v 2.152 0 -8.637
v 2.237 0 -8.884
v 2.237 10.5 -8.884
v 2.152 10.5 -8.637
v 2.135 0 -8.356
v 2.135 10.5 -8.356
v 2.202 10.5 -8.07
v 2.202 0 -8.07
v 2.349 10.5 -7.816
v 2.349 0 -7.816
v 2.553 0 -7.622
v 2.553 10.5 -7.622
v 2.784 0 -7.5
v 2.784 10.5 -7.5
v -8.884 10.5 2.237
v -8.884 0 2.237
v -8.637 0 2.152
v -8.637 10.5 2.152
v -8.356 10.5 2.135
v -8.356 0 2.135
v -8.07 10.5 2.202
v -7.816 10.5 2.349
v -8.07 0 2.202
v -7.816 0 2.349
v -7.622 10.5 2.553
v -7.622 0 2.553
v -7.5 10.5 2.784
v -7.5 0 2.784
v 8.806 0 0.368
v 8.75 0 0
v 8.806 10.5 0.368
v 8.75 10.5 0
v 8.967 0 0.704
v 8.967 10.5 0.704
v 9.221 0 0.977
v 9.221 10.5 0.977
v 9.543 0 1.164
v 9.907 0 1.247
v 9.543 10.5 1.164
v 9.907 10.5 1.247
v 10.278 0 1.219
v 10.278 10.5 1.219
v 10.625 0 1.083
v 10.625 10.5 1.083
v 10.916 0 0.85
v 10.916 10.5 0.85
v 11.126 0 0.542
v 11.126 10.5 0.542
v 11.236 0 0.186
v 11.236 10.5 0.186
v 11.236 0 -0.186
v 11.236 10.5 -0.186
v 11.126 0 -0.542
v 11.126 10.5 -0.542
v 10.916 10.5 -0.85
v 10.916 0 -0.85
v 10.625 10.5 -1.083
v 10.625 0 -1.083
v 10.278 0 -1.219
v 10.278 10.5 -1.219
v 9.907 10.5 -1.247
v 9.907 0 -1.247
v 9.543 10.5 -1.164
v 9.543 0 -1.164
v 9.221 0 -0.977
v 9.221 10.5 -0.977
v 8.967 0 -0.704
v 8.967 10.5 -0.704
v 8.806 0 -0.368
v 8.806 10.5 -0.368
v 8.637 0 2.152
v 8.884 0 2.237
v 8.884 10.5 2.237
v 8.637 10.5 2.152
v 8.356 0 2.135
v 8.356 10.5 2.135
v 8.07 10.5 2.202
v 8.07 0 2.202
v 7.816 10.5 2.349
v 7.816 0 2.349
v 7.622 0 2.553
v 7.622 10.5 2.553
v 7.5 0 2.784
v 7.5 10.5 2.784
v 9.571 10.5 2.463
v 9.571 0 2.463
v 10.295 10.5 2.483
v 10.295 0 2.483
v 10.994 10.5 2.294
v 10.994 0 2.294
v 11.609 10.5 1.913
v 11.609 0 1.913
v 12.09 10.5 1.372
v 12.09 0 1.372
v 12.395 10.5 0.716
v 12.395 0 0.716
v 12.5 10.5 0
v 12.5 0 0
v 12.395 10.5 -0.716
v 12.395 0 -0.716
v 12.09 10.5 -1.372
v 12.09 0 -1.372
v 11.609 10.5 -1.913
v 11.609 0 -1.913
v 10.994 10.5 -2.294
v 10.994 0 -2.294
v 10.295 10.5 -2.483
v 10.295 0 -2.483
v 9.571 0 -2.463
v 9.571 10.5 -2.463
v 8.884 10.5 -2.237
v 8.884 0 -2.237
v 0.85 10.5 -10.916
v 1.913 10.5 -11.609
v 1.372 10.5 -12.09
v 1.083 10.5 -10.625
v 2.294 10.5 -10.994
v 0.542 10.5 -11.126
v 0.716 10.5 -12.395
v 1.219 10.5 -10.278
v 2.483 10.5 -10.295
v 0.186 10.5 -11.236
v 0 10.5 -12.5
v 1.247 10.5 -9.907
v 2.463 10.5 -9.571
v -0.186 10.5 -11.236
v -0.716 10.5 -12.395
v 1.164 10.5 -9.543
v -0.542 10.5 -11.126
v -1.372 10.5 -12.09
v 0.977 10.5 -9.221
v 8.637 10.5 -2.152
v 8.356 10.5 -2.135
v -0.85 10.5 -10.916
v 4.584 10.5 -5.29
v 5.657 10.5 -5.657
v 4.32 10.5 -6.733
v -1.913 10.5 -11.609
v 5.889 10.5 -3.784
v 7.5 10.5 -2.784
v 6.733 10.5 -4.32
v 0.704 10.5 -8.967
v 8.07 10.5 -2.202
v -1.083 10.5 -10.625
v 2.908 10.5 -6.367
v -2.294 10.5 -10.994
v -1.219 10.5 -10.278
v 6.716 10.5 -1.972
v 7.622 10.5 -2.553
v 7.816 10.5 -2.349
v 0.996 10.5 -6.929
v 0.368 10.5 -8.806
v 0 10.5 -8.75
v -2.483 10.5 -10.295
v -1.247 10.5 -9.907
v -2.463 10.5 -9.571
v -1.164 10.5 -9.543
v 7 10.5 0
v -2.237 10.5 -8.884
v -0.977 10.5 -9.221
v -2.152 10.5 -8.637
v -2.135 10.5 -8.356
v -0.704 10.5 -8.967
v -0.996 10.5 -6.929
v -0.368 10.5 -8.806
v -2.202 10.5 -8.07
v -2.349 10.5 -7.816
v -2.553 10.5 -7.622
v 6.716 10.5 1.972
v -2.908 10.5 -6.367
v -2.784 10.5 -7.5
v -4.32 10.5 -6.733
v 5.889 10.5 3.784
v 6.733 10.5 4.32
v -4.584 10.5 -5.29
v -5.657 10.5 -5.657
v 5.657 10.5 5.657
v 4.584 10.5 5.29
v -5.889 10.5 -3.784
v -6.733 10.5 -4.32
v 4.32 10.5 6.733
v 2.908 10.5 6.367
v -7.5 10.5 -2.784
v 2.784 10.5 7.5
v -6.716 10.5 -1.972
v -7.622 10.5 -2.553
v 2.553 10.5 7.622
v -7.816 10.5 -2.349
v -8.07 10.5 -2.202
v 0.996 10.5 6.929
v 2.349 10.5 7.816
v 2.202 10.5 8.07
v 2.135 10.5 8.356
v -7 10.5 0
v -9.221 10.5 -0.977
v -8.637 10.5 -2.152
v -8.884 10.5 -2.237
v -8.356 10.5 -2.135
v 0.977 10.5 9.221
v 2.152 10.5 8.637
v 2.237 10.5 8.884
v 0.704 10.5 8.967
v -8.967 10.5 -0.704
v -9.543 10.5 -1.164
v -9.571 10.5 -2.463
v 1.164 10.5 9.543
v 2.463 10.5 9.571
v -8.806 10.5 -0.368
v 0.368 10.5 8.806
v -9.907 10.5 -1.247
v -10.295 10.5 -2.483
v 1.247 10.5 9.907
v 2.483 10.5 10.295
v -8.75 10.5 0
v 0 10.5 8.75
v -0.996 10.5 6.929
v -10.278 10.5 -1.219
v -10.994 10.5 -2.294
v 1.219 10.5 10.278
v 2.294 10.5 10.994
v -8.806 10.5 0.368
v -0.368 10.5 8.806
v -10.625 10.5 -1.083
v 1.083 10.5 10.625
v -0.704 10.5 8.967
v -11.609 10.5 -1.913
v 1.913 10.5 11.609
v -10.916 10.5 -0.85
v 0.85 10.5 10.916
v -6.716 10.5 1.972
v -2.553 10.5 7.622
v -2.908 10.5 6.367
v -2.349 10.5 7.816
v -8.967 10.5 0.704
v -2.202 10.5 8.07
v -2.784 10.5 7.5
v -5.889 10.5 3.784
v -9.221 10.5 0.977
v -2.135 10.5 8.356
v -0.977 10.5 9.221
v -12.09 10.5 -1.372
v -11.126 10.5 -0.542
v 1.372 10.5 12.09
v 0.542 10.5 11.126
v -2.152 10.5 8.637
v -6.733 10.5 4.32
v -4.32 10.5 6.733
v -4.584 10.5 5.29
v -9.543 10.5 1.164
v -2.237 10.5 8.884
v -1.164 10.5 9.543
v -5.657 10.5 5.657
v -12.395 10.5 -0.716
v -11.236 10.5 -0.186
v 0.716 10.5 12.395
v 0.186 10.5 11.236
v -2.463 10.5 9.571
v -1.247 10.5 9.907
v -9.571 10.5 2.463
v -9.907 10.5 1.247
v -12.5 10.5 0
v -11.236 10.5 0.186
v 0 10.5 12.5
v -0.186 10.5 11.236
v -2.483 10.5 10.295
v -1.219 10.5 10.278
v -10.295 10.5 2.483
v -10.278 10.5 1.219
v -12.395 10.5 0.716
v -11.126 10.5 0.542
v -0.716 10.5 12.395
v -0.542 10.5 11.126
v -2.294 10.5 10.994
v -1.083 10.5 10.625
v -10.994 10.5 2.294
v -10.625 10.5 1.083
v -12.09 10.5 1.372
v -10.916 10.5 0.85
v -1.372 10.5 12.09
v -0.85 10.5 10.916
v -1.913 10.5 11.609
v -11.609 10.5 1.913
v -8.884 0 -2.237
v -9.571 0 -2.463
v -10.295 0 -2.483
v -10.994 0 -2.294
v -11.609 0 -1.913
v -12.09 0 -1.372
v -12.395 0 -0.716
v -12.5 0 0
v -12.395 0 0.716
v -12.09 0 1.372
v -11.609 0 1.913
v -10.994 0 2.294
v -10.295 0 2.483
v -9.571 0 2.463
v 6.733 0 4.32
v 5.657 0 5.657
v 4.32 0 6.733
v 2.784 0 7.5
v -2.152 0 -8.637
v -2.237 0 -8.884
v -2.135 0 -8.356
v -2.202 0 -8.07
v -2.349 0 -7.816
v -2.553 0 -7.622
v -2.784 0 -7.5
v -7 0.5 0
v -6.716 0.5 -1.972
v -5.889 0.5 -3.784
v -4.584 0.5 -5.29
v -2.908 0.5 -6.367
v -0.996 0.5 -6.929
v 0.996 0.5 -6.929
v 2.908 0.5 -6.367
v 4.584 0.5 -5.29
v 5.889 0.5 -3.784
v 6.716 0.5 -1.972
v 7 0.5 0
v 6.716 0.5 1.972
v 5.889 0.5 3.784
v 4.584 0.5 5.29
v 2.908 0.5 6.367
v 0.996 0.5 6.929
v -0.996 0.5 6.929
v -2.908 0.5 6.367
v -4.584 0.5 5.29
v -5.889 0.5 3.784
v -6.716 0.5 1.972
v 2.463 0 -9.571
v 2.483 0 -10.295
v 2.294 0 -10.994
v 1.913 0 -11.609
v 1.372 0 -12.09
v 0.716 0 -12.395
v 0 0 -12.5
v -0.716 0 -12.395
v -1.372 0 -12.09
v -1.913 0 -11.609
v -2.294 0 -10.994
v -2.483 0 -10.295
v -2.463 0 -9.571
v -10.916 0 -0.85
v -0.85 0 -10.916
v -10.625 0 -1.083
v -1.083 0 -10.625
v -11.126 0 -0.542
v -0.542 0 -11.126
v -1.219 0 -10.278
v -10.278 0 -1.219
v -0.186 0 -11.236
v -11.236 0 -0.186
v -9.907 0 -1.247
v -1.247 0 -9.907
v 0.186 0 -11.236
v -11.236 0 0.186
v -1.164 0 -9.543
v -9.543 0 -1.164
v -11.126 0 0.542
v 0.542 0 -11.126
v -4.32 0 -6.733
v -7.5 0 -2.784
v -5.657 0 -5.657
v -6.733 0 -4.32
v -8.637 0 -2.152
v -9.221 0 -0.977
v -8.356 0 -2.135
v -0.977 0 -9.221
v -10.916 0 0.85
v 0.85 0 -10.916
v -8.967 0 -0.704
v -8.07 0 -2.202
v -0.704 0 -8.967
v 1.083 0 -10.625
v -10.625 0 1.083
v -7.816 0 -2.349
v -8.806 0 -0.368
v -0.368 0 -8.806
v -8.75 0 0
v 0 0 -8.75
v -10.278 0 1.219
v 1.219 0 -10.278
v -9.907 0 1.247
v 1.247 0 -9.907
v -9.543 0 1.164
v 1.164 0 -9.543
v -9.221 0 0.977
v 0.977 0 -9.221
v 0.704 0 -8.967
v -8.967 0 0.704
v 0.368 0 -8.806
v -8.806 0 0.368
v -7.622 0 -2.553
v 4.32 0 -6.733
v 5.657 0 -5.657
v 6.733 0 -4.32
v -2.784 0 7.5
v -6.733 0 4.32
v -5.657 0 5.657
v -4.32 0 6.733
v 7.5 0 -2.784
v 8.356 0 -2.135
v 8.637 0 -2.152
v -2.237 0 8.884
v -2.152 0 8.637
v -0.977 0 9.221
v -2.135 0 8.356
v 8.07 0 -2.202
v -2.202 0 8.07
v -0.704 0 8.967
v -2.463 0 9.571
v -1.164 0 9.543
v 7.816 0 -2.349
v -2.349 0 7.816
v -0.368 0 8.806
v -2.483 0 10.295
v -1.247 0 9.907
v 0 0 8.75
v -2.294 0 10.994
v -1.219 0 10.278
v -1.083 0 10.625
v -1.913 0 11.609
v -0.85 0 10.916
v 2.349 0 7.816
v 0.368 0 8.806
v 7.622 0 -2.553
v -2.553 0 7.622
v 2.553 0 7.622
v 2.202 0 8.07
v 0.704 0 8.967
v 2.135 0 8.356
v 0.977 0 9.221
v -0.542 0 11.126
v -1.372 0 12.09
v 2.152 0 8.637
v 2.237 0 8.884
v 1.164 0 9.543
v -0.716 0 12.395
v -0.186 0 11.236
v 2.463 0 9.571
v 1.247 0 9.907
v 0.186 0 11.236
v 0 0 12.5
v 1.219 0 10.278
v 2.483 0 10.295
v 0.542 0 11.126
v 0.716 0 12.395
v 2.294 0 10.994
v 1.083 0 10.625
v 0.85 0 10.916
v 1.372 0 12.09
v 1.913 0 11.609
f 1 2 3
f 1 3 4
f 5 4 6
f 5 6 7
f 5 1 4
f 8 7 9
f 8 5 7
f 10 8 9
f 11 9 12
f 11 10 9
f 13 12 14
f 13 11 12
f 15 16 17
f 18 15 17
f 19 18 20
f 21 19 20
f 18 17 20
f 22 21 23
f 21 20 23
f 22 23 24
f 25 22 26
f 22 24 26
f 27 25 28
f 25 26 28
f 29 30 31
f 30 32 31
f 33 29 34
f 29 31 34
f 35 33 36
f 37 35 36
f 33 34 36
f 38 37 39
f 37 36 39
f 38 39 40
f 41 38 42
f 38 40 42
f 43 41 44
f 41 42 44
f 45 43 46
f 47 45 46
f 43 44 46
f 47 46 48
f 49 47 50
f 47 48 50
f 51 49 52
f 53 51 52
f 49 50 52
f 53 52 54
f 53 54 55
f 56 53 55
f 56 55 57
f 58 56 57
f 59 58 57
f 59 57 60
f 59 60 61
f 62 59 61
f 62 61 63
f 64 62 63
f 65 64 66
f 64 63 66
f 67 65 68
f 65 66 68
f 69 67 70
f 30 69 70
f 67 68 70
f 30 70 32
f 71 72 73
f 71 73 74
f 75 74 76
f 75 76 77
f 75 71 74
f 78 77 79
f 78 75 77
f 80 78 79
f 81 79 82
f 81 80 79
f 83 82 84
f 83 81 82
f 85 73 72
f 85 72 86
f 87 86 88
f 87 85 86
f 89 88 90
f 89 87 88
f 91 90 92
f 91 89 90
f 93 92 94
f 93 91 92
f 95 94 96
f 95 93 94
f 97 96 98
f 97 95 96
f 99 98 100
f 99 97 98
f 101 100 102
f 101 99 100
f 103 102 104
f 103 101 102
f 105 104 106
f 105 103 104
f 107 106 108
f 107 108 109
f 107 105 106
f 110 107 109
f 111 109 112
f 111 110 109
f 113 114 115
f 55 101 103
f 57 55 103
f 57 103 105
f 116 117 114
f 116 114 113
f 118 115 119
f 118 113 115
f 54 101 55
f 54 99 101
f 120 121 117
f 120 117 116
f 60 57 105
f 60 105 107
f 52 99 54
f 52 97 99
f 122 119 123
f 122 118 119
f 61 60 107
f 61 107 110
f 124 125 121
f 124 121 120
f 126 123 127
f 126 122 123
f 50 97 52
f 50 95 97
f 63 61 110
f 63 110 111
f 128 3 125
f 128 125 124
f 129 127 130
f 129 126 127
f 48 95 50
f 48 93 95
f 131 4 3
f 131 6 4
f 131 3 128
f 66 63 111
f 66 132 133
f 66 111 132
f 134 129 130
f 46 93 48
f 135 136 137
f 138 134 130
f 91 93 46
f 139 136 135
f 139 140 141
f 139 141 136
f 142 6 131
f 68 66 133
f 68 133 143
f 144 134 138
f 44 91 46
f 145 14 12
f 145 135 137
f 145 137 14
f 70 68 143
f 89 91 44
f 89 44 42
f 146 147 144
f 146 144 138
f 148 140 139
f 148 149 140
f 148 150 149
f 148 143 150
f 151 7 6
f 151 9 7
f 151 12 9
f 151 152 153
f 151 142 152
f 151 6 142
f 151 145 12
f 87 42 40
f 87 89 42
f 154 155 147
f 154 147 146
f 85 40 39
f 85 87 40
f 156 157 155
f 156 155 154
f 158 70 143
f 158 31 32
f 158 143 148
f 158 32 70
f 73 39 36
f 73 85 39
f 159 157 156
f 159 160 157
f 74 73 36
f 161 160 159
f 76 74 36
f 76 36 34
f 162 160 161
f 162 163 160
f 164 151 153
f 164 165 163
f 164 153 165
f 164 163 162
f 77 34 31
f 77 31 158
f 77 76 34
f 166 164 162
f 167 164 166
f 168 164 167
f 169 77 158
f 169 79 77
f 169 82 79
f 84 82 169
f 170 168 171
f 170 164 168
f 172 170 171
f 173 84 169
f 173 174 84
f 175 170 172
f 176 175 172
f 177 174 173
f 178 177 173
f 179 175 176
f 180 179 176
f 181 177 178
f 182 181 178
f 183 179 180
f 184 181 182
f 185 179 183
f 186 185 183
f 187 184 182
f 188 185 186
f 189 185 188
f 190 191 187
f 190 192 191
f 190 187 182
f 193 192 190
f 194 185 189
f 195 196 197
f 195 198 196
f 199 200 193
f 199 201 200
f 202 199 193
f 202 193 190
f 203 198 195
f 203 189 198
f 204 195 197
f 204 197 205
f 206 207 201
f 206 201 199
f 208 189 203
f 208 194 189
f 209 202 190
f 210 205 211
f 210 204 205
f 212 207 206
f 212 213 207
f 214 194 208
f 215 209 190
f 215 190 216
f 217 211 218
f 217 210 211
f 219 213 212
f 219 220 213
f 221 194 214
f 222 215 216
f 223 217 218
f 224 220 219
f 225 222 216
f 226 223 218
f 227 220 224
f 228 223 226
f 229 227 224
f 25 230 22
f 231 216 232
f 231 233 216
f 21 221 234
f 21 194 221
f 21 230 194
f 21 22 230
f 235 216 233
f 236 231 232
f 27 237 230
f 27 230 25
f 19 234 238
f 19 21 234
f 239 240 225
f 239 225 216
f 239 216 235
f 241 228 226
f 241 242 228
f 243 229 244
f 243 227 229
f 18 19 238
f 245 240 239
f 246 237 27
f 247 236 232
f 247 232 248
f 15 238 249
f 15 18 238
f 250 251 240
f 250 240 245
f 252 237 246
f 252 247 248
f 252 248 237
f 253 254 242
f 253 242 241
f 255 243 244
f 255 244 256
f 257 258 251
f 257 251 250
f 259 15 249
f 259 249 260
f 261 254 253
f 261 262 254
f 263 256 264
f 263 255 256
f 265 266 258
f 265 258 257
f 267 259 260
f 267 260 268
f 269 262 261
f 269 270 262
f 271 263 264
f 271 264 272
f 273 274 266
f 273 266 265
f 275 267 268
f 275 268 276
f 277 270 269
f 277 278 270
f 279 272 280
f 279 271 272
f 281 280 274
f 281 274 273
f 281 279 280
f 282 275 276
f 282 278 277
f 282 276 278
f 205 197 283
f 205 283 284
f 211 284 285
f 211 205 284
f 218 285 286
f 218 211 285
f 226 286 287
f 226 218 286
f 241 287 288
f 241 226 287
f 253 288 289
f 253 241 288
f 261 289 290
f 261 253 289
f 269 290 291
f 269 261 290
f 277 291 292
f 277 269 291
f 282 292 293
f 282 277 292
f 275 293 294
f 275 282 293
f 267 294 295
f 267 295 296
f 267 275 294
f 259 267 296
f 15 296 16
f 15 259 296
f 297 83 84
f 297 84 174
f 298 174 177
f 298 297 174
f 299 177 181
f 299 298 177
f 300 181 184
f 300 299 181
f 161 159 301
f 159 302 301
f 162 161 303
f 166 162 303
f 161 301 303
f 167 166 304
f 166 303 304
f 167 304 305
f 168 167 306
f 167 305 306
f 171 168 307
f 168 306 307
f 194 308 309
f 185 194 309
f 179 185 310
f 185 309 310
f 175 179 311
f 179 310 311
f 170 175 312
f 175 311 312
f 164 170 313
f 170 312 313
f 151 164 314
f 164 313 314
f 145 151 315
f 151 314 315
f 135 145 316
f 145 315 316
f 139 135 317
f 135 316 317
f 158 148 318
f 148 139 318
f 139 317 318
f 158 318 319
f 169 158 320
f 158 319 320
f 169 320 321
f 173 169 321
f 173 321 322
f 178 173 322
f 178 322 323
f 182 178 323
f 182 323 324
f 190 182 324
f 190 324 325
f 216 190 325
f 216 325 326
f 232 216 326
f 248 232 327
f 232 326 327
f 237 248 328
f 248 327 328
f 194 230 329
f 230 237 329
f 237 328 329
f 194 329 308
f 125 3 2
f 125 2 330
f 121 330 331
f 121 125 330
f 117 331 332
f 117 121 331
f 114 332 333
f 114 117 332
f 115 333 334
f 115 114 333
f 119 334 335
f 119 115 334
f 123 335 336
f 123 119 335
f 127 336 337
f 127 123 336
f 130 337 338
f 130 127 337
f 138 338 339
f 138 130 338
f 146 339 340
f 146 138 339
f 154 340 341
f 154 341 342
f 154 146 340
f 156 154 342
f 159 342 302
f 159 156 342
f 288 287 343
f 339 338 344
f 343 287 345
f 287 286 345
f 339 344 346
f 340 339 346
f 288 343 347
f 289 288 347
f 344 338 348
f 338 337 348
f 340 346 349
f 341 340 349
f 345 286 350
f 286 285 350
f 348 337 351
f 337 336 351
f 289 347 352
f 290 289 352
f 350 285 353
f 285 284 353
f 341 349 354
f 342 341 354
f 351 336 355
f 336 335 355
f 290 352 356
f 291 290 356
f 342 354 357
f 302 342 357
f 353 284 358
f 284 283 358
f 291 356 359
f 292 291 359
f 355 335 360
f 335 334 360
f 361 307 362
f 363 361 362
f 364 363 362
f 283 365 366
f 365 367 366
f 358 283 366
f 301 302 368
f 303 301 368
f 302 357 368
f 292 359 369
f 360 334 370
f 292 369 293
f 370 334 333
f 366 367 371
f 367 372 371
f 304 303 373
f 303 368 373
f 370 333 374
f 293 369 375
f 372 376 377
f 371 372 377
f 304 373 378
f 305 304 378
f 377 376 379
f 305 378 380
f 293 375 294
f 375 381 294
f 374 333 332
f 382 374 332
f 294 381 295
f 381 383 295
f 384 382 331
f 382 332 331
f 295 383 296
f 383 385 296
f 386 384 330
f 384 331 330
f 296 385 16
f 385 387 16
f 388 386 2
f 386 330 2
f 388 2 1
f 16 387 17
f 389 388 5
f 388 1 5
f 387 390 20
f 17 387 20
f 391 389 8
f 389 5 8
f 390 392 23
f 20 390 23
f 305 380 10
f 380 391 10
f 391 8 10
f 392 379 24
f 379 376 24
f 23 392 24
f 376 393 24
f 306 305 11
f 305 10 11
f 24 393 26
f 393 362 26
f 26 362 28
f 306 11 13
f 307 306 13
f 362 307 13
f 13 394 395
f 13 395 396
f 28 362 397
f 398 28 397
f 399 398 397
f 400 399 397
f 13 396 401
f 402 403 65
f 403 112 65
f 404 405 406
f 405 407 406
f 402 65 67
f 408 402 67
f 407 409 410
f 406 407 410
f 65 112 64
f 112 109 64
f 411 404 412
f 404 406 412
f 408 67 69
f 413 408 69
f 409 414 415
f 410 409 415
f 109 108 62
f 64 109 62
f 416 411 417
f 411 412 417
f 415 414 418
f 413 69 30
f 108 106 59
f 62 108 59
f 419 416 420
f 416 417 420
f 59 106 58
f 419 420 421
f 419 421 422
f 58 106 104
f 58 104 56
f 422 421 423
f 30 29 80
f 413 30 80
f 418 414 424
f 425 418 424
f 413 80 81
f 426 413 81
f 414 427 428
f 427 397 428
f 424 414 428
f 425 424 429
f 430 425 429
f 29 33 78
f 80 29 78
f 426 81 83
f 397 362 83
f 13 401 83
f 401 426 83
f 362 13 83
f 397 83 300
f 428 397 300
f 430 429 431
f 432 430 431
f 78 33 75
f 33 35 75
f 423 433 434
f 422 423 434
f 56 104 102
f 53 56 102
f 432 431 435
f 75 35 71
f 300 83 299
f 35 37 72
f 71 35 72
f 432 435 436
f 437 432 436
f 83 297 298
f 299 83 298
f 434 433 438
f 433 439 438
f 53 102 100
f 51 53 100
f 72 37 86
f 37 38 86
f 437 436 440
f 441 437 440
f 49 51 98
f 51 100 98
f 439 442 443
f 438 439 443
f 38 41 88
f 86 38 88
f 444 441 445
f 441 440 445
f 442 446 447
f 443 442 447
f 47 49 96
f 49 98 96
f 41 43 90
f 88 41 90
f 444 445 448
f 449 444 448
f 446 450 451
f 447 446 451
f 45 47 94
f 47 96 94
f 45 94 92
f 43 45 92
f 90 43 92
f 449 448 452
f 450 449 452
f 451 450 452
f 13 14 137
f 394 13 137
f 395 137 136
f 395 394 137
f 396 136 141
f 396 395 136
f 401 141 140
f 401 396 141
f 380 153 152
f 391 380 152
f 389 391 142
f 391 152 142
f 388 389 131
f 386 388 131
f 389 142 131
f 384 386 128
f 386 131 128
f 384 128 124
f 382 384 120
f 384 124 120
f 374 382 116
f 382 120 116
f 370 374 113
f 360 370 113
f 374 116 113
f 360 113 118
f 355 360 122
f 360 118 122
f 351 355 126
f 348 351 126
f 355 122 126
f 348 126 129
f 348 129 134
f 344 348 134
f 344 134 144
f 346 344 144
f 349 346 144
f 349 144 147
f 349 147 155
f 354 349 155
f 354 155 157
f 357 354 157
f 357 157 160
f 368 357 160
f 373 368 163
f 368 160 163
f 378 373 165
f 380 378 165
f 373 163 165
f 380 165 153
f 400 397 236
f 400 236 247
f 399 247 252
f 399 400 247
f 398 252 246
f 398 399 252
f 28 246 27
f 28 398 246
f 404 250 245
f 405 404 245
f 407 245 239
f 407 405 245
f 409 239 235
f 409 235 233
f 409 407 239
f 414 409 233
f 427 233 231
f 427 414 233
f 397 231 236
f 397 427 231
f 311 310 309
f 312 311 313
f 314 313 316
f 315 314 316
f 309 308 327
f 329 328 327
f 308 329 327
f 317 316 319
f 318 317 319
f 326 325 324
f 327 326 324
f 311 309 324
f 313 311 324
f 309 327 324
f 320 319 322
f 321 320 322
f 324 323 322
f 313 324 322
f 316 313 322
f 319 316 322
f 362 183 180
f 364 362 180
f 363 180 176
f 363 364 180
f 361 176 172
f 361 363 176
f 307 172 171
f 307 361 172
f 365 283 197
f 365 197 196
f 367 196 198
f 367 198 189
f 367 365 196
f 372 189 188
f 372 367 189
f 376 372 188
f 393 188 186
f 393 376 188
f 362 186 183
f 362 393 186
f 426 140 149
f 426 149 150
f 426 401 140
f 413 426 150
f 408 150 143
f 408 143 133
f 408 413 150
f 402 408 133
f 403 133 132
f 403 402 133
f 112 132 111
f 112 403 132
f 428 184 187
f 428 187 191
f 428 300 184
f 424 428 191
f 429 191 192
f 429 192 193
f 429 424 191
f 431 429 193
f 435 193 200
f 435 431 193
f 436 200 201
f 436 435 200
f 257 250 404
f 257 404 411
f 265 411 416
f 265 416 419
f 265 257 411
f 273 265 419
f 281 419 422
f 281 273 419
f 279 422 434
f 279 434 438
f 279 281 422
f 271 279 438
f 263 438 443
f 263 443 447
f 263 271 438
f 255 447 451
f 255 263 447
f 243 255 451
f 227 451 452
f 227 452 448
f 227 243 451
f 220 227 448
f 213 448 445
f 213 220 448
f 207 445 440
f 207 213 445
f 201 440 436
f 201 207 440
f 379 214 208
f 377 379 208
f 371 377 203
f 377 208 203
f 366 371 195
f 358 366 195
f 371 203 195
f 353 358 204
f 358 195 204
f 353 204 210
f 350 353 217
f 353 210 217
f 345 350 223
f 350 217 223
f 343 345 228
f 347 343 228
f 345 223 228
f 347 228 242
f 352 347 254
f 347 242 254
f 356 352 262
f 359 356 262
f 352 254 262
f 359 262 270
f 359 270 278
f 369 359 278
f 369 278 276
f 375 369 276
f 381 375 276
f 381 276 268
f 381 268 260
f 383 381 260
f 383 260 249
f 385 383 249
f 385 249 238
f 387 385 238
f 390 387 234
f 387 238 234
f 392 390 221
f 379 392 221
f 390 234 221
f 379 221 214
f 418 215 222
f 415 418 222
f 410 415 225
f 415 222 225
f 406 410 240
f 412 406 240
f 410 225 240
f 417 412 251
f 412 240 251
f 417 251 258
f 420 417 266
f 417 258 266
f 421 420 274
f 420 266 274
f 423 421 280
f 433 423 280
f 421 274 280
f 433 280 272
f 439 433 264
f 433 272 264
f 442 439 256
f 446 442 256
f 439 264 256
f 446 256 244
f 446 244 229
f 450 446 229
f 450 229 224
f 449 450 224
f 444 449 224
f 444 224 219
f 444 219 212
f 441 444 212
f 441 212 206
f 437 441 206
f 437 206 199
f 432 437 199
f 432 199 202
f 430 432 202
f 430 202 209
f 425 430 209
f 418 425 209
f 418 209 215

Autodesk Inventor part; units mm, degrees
ref_plane "YZ Plane" through (0, 0, 0) normal (1, 0, 0) x (0, 1, 0)
ref_plane "XZ Plane" through (0, 0, 0) normal (0, 1, 0) x (-1, 0, 0)
ref_plane "XY Plane" through (0, 0, 0) normal (0, 0, 1) x (1, 0, 0)
sketch "Sketch1" plane through (0, 0, 0) normal (0, 1, 0) x (-1, 0, 0)
  circle A0 centre (0, 0) radius 7
  circle A1 centre (0, 0) radius 8
  dimension "d0" = 14
  dimension "d1" = 1
extrude "Extrusion1" add sketch "Sketch1" along normal blind 10.5
sketch "Sketch2" plane through (0, 0, 0) normal (0, -1, 0) x (1, 0, 0)
  circle A0 centre (0, 0) radius 8
extrude "Extrusion2" add sketch "Sketch2" against normal blind 0.5
sketch "Sketch4" plane through (0, 10.5, 0) normal (0, 1, 0) x (1, 0, 0)
  circle A0 centre (-10, 0) radius 1.25
  circle A1 centre (-10, 0) radius 2.5
  point P0 (0, 0)
  dimension "d6" = 5
  dimension "d7" = 2.5
  dimension "d8" = 10
extrude "Extrusion3" add sketch "Sketch4" against normal up to surface (10.5 mm away)
pattern_circular "Circular Pattern1" count 4 over 360 about axis through (0, 0, 0) along (0, 1, 0) of "Extrusion3"
fillet "Fillet1" radius 1 8 edges at (7.8875, 5.25, -1.3369) (7.8875, 5.25, 1.3369) (1.3369, 5.25, 7.8875) (-1.3369, 5.25, 7.8875) (-7.8875, 5.25, 1.3369) (-7.8875, 5.25, -1.3369) (-1.3369, 5.25, -7.8875) (1.3369, 5.25, -7.8875)
properties part number "PDMS_insert"
